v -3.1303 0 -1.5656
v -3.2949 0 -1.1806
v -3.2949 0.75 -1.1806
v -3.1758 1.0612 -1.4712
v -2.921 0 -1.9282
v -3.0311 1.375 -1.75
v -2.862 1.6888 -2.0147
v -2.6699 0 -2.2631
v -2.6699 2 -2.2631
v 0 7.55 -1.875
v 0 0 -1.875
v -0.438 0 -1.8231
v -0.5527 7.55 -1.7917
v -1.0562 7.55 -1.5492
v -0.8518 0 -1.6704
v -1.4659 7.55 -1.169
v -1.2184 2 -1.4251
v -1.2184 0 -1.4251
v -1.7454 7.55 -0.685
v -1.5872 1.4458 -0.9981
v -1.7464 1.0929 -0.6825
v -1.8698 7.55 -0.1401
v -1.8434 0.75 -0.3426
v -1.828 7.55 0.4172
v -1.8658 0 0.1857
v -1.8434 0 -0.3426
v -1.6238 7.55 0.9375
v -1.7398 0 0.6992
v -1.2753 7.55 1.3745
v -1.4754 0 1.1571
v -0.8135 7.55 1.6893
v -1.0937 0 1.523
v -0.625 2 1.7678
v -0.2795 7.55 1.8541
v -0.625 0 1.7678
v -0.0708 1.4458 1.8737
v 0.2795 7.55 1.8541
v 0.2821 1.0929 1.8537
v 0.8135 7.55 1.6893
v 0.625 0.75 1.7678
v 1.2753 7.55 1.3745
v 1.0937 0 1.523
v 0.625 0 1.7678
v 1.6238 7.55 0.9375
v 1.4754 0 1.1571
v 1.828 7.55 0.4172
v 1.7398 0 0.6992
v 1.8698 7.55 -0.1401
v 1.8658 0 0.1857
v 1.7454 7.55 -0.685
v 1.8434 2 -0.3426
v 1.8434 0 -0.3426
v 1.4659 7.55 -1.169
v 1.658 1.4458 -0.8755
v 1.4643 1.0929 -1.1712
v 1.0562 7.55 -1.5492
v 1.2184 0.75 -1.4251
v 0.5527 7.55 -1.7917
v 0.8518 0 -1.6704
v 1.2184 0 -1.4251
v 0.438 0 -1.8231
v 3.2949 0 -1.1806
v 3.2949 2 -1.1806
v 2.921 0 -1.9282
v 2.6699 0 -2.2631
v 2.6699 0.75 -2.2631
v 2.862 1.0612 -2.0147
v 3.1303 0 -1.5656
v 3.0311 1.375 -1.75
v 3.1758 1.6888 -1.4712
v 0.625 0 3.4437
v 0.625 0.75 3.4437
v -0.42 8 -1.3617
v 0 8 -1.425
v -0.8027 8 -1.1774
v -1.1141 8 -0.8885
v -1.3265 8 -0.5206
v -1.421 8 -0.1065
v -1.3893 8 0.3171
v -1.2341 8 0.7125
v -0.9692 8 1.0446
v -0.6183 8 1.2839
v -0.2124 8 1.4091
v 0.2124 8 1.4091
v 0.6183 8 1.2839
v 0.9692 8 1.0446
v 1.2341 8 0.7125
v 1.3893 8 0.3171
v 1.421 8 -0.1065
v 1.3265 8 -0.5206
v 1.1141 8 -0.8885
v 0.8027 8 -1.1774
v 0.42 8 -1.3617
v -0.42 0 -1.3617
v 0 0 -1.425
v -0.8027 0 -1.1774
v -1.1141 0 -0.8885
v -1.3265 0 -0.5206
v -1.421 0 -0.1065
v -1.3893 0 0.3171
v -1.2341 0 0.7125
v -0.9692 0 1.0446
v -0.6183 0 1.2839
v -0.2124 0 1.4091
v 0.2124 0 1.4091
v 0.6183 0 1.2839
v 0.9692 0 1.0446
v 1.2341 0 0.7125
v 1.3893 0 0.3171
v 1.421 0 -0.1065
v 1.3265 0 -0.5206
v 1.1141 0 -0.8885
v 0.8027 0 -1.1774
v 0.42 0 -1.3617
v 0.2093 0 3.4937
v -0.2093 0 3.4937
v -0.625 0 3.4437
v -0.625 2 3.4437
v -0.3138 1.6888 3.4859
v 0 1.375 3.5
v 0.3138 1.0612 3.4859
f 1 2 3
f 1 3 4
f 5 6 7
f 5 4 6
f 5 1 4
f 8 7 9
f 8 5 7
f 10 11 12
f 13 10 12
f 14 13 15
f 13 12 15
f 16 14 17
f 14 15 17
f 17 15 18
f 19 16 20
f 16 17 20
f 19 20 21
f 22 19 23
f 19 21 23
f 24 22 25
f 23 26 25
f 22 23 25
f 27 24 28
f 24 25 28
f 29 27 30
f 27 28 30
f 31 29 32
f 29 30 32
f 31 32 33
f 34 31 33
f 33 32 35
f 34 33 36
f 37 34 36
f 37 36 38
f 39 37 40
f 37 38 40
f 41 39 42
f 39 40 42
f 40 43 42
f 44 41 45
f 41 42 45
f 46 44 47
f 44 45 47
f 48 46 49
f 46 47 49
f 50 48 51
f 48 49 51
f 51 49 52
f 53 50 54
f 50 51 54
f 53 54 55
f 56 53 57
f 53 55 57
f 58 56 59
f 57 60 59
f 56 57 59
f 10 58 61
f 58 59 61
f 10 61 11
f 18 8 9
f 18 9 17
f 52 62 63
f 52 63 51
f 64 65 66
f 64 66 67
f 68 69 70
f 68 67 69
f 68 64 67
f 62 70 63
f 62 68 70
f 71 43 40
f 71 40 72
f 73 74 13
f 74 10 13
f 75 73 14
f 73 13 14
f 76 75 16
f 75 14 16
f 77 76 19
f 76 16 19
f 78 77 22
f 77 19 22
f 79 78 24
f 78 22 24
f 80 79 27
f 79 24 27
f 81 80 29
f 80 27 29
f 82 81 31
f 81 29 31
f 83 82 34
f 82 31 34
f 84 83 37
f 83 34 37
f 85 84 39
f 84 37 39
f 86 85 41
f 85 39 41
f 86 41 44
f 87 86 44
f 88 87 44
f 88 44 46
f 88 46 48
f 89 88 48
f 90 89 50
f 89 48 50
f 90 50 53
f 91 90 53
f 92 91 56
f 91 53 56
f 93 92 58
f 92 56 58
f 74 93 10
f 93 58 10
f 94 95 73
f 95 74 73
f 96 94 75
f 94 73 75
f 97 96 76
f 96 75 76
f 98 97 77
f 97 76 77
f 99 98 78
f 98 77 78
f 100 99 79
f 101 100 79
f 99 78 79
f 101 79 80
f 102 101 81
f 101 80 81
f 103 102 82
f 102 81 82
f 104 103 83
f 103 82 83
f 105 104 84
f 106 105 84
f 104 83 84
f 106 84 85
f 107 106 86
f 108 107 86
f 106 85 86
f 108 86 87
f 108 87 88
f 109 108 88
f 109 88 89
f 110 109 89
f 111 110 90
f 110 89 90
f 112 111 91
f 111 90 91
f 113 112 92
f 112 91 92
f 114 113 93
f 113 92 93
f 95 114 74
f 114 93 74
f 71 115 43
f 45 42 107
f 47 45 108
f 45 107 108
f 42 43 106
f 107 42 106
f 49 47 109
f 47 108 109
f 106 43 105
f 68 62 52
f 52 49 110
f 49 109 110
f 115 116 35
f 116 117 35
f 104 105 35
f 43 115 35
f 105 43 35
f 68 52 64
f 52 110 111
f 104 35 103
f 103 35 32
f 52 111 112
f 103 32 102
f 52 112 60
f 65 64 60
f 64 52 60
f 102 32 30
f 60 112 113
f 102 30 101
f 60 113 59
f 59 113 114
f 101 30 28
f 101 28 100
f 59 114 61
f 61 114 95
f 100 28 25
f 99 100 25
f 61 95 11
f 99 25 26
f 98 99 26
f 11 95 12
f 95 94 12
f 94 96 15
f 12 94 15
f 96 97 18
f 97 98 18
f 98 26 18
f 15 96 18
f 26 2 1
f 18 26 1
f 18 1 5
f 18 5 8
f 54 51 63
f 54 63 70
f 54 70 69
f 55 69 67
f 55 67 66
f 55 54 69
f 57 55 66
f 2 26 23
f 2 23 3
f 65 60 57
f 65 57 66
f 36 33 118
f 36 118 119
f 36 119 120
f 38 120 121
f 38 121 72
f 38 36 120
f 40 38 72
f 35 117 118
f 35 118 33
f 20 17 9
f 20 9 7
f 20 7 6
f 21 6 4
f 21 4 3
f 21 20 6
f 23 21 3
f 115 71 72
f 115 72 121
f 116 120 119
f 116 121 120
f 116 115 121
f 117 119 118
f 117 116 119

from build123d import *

# Parameters (mm, degrees)
AUFSATZ_LINEAR_AUSTRAGEN1_DEPTH = 2
SCHNITT_LINEAR_AUSTRAGEN1_DEPTH = 4.5
KREISMUSTER1_COUNT              = 3


with BuildPart() as part:
    # Skizze1 → Rotation1 (revolve)
    with BuildSketch(Plane.XY, mode=Mode.PRIVATE) as rotation1_sk:
        Polygon((1.425, 0), (1.425, 8), (1.875, 7.55), (1.875, 0), align=None)
    revolve(rotation1_sk.sketch.rotate(Axis((0, 0, 0), (0, 1, 0)), 90), axis=Axis((0, 0, 0), (0, 1, 0)))  # turned: the seam where the file's is


with BuildPart() as body_2:
    # Skizze2 → Aufsatz-Linear austragen1 (new body)
    with BuildSketch(Plane(origin=(0, 0, 0), x_dir=(1, 0, 0), z_dir=(0, 1, 0))):
        with BuildLine():
            Line((-0.625, -3.443744328), (-0.625, -1.767766953))
            ThreePointArc((-0.625, -1.767766953), (0, -1.875), (0.625, -1.767766953))
            Line((0.625, -1.767766953), (0.625, -3.443744328))
            ThreePointArc((0.625, -3.443744328), (0, -3.5), (-0.625, -3.443744328))
        make_face()
    extrude(amount=AUFSATZ_LINEAR_AUSTRAGEN1_DEPTH)

    # Skizze3 → Schnitt-Linear austragen1 (cut, through all)
    with BuildSketch(Plane.XY):
        Polygon((-0.625, 2), (0.625, 0.75), (0.625, 2), align=None)
    extrude(amount=SCHNITT_LINEAR_AUSTRAGEN1_DEPTH, mode=Mode.SUBTRACT)


with BuildPart() as kreismuster1_1:
    # Kreismuster1: pattern copy
    add(body_2.part.rotate(Axis((0, 0, 0), (0, 1, 0)), 1 * 360 / KREISMUSTER1_COUNT))


with BuildPart() as kreismuster1_2:
    # Kreismuster1: pattern copy
    add(body_2.part.rotate(Axis((0, 0, 0), (0, 1, 0)), 2 * 360 / KREISMUSTER1_COUNT))


with BuildPart() as body_2_1:
    add(body_2.part)

    # Kombinieren1: union part, Kreismuster1_1, Kreismuster1_2
    add(part.part)
    add(kreismuster1_1.part)
    add(kreismuster1_2.part)


solid = body_2_1.part
